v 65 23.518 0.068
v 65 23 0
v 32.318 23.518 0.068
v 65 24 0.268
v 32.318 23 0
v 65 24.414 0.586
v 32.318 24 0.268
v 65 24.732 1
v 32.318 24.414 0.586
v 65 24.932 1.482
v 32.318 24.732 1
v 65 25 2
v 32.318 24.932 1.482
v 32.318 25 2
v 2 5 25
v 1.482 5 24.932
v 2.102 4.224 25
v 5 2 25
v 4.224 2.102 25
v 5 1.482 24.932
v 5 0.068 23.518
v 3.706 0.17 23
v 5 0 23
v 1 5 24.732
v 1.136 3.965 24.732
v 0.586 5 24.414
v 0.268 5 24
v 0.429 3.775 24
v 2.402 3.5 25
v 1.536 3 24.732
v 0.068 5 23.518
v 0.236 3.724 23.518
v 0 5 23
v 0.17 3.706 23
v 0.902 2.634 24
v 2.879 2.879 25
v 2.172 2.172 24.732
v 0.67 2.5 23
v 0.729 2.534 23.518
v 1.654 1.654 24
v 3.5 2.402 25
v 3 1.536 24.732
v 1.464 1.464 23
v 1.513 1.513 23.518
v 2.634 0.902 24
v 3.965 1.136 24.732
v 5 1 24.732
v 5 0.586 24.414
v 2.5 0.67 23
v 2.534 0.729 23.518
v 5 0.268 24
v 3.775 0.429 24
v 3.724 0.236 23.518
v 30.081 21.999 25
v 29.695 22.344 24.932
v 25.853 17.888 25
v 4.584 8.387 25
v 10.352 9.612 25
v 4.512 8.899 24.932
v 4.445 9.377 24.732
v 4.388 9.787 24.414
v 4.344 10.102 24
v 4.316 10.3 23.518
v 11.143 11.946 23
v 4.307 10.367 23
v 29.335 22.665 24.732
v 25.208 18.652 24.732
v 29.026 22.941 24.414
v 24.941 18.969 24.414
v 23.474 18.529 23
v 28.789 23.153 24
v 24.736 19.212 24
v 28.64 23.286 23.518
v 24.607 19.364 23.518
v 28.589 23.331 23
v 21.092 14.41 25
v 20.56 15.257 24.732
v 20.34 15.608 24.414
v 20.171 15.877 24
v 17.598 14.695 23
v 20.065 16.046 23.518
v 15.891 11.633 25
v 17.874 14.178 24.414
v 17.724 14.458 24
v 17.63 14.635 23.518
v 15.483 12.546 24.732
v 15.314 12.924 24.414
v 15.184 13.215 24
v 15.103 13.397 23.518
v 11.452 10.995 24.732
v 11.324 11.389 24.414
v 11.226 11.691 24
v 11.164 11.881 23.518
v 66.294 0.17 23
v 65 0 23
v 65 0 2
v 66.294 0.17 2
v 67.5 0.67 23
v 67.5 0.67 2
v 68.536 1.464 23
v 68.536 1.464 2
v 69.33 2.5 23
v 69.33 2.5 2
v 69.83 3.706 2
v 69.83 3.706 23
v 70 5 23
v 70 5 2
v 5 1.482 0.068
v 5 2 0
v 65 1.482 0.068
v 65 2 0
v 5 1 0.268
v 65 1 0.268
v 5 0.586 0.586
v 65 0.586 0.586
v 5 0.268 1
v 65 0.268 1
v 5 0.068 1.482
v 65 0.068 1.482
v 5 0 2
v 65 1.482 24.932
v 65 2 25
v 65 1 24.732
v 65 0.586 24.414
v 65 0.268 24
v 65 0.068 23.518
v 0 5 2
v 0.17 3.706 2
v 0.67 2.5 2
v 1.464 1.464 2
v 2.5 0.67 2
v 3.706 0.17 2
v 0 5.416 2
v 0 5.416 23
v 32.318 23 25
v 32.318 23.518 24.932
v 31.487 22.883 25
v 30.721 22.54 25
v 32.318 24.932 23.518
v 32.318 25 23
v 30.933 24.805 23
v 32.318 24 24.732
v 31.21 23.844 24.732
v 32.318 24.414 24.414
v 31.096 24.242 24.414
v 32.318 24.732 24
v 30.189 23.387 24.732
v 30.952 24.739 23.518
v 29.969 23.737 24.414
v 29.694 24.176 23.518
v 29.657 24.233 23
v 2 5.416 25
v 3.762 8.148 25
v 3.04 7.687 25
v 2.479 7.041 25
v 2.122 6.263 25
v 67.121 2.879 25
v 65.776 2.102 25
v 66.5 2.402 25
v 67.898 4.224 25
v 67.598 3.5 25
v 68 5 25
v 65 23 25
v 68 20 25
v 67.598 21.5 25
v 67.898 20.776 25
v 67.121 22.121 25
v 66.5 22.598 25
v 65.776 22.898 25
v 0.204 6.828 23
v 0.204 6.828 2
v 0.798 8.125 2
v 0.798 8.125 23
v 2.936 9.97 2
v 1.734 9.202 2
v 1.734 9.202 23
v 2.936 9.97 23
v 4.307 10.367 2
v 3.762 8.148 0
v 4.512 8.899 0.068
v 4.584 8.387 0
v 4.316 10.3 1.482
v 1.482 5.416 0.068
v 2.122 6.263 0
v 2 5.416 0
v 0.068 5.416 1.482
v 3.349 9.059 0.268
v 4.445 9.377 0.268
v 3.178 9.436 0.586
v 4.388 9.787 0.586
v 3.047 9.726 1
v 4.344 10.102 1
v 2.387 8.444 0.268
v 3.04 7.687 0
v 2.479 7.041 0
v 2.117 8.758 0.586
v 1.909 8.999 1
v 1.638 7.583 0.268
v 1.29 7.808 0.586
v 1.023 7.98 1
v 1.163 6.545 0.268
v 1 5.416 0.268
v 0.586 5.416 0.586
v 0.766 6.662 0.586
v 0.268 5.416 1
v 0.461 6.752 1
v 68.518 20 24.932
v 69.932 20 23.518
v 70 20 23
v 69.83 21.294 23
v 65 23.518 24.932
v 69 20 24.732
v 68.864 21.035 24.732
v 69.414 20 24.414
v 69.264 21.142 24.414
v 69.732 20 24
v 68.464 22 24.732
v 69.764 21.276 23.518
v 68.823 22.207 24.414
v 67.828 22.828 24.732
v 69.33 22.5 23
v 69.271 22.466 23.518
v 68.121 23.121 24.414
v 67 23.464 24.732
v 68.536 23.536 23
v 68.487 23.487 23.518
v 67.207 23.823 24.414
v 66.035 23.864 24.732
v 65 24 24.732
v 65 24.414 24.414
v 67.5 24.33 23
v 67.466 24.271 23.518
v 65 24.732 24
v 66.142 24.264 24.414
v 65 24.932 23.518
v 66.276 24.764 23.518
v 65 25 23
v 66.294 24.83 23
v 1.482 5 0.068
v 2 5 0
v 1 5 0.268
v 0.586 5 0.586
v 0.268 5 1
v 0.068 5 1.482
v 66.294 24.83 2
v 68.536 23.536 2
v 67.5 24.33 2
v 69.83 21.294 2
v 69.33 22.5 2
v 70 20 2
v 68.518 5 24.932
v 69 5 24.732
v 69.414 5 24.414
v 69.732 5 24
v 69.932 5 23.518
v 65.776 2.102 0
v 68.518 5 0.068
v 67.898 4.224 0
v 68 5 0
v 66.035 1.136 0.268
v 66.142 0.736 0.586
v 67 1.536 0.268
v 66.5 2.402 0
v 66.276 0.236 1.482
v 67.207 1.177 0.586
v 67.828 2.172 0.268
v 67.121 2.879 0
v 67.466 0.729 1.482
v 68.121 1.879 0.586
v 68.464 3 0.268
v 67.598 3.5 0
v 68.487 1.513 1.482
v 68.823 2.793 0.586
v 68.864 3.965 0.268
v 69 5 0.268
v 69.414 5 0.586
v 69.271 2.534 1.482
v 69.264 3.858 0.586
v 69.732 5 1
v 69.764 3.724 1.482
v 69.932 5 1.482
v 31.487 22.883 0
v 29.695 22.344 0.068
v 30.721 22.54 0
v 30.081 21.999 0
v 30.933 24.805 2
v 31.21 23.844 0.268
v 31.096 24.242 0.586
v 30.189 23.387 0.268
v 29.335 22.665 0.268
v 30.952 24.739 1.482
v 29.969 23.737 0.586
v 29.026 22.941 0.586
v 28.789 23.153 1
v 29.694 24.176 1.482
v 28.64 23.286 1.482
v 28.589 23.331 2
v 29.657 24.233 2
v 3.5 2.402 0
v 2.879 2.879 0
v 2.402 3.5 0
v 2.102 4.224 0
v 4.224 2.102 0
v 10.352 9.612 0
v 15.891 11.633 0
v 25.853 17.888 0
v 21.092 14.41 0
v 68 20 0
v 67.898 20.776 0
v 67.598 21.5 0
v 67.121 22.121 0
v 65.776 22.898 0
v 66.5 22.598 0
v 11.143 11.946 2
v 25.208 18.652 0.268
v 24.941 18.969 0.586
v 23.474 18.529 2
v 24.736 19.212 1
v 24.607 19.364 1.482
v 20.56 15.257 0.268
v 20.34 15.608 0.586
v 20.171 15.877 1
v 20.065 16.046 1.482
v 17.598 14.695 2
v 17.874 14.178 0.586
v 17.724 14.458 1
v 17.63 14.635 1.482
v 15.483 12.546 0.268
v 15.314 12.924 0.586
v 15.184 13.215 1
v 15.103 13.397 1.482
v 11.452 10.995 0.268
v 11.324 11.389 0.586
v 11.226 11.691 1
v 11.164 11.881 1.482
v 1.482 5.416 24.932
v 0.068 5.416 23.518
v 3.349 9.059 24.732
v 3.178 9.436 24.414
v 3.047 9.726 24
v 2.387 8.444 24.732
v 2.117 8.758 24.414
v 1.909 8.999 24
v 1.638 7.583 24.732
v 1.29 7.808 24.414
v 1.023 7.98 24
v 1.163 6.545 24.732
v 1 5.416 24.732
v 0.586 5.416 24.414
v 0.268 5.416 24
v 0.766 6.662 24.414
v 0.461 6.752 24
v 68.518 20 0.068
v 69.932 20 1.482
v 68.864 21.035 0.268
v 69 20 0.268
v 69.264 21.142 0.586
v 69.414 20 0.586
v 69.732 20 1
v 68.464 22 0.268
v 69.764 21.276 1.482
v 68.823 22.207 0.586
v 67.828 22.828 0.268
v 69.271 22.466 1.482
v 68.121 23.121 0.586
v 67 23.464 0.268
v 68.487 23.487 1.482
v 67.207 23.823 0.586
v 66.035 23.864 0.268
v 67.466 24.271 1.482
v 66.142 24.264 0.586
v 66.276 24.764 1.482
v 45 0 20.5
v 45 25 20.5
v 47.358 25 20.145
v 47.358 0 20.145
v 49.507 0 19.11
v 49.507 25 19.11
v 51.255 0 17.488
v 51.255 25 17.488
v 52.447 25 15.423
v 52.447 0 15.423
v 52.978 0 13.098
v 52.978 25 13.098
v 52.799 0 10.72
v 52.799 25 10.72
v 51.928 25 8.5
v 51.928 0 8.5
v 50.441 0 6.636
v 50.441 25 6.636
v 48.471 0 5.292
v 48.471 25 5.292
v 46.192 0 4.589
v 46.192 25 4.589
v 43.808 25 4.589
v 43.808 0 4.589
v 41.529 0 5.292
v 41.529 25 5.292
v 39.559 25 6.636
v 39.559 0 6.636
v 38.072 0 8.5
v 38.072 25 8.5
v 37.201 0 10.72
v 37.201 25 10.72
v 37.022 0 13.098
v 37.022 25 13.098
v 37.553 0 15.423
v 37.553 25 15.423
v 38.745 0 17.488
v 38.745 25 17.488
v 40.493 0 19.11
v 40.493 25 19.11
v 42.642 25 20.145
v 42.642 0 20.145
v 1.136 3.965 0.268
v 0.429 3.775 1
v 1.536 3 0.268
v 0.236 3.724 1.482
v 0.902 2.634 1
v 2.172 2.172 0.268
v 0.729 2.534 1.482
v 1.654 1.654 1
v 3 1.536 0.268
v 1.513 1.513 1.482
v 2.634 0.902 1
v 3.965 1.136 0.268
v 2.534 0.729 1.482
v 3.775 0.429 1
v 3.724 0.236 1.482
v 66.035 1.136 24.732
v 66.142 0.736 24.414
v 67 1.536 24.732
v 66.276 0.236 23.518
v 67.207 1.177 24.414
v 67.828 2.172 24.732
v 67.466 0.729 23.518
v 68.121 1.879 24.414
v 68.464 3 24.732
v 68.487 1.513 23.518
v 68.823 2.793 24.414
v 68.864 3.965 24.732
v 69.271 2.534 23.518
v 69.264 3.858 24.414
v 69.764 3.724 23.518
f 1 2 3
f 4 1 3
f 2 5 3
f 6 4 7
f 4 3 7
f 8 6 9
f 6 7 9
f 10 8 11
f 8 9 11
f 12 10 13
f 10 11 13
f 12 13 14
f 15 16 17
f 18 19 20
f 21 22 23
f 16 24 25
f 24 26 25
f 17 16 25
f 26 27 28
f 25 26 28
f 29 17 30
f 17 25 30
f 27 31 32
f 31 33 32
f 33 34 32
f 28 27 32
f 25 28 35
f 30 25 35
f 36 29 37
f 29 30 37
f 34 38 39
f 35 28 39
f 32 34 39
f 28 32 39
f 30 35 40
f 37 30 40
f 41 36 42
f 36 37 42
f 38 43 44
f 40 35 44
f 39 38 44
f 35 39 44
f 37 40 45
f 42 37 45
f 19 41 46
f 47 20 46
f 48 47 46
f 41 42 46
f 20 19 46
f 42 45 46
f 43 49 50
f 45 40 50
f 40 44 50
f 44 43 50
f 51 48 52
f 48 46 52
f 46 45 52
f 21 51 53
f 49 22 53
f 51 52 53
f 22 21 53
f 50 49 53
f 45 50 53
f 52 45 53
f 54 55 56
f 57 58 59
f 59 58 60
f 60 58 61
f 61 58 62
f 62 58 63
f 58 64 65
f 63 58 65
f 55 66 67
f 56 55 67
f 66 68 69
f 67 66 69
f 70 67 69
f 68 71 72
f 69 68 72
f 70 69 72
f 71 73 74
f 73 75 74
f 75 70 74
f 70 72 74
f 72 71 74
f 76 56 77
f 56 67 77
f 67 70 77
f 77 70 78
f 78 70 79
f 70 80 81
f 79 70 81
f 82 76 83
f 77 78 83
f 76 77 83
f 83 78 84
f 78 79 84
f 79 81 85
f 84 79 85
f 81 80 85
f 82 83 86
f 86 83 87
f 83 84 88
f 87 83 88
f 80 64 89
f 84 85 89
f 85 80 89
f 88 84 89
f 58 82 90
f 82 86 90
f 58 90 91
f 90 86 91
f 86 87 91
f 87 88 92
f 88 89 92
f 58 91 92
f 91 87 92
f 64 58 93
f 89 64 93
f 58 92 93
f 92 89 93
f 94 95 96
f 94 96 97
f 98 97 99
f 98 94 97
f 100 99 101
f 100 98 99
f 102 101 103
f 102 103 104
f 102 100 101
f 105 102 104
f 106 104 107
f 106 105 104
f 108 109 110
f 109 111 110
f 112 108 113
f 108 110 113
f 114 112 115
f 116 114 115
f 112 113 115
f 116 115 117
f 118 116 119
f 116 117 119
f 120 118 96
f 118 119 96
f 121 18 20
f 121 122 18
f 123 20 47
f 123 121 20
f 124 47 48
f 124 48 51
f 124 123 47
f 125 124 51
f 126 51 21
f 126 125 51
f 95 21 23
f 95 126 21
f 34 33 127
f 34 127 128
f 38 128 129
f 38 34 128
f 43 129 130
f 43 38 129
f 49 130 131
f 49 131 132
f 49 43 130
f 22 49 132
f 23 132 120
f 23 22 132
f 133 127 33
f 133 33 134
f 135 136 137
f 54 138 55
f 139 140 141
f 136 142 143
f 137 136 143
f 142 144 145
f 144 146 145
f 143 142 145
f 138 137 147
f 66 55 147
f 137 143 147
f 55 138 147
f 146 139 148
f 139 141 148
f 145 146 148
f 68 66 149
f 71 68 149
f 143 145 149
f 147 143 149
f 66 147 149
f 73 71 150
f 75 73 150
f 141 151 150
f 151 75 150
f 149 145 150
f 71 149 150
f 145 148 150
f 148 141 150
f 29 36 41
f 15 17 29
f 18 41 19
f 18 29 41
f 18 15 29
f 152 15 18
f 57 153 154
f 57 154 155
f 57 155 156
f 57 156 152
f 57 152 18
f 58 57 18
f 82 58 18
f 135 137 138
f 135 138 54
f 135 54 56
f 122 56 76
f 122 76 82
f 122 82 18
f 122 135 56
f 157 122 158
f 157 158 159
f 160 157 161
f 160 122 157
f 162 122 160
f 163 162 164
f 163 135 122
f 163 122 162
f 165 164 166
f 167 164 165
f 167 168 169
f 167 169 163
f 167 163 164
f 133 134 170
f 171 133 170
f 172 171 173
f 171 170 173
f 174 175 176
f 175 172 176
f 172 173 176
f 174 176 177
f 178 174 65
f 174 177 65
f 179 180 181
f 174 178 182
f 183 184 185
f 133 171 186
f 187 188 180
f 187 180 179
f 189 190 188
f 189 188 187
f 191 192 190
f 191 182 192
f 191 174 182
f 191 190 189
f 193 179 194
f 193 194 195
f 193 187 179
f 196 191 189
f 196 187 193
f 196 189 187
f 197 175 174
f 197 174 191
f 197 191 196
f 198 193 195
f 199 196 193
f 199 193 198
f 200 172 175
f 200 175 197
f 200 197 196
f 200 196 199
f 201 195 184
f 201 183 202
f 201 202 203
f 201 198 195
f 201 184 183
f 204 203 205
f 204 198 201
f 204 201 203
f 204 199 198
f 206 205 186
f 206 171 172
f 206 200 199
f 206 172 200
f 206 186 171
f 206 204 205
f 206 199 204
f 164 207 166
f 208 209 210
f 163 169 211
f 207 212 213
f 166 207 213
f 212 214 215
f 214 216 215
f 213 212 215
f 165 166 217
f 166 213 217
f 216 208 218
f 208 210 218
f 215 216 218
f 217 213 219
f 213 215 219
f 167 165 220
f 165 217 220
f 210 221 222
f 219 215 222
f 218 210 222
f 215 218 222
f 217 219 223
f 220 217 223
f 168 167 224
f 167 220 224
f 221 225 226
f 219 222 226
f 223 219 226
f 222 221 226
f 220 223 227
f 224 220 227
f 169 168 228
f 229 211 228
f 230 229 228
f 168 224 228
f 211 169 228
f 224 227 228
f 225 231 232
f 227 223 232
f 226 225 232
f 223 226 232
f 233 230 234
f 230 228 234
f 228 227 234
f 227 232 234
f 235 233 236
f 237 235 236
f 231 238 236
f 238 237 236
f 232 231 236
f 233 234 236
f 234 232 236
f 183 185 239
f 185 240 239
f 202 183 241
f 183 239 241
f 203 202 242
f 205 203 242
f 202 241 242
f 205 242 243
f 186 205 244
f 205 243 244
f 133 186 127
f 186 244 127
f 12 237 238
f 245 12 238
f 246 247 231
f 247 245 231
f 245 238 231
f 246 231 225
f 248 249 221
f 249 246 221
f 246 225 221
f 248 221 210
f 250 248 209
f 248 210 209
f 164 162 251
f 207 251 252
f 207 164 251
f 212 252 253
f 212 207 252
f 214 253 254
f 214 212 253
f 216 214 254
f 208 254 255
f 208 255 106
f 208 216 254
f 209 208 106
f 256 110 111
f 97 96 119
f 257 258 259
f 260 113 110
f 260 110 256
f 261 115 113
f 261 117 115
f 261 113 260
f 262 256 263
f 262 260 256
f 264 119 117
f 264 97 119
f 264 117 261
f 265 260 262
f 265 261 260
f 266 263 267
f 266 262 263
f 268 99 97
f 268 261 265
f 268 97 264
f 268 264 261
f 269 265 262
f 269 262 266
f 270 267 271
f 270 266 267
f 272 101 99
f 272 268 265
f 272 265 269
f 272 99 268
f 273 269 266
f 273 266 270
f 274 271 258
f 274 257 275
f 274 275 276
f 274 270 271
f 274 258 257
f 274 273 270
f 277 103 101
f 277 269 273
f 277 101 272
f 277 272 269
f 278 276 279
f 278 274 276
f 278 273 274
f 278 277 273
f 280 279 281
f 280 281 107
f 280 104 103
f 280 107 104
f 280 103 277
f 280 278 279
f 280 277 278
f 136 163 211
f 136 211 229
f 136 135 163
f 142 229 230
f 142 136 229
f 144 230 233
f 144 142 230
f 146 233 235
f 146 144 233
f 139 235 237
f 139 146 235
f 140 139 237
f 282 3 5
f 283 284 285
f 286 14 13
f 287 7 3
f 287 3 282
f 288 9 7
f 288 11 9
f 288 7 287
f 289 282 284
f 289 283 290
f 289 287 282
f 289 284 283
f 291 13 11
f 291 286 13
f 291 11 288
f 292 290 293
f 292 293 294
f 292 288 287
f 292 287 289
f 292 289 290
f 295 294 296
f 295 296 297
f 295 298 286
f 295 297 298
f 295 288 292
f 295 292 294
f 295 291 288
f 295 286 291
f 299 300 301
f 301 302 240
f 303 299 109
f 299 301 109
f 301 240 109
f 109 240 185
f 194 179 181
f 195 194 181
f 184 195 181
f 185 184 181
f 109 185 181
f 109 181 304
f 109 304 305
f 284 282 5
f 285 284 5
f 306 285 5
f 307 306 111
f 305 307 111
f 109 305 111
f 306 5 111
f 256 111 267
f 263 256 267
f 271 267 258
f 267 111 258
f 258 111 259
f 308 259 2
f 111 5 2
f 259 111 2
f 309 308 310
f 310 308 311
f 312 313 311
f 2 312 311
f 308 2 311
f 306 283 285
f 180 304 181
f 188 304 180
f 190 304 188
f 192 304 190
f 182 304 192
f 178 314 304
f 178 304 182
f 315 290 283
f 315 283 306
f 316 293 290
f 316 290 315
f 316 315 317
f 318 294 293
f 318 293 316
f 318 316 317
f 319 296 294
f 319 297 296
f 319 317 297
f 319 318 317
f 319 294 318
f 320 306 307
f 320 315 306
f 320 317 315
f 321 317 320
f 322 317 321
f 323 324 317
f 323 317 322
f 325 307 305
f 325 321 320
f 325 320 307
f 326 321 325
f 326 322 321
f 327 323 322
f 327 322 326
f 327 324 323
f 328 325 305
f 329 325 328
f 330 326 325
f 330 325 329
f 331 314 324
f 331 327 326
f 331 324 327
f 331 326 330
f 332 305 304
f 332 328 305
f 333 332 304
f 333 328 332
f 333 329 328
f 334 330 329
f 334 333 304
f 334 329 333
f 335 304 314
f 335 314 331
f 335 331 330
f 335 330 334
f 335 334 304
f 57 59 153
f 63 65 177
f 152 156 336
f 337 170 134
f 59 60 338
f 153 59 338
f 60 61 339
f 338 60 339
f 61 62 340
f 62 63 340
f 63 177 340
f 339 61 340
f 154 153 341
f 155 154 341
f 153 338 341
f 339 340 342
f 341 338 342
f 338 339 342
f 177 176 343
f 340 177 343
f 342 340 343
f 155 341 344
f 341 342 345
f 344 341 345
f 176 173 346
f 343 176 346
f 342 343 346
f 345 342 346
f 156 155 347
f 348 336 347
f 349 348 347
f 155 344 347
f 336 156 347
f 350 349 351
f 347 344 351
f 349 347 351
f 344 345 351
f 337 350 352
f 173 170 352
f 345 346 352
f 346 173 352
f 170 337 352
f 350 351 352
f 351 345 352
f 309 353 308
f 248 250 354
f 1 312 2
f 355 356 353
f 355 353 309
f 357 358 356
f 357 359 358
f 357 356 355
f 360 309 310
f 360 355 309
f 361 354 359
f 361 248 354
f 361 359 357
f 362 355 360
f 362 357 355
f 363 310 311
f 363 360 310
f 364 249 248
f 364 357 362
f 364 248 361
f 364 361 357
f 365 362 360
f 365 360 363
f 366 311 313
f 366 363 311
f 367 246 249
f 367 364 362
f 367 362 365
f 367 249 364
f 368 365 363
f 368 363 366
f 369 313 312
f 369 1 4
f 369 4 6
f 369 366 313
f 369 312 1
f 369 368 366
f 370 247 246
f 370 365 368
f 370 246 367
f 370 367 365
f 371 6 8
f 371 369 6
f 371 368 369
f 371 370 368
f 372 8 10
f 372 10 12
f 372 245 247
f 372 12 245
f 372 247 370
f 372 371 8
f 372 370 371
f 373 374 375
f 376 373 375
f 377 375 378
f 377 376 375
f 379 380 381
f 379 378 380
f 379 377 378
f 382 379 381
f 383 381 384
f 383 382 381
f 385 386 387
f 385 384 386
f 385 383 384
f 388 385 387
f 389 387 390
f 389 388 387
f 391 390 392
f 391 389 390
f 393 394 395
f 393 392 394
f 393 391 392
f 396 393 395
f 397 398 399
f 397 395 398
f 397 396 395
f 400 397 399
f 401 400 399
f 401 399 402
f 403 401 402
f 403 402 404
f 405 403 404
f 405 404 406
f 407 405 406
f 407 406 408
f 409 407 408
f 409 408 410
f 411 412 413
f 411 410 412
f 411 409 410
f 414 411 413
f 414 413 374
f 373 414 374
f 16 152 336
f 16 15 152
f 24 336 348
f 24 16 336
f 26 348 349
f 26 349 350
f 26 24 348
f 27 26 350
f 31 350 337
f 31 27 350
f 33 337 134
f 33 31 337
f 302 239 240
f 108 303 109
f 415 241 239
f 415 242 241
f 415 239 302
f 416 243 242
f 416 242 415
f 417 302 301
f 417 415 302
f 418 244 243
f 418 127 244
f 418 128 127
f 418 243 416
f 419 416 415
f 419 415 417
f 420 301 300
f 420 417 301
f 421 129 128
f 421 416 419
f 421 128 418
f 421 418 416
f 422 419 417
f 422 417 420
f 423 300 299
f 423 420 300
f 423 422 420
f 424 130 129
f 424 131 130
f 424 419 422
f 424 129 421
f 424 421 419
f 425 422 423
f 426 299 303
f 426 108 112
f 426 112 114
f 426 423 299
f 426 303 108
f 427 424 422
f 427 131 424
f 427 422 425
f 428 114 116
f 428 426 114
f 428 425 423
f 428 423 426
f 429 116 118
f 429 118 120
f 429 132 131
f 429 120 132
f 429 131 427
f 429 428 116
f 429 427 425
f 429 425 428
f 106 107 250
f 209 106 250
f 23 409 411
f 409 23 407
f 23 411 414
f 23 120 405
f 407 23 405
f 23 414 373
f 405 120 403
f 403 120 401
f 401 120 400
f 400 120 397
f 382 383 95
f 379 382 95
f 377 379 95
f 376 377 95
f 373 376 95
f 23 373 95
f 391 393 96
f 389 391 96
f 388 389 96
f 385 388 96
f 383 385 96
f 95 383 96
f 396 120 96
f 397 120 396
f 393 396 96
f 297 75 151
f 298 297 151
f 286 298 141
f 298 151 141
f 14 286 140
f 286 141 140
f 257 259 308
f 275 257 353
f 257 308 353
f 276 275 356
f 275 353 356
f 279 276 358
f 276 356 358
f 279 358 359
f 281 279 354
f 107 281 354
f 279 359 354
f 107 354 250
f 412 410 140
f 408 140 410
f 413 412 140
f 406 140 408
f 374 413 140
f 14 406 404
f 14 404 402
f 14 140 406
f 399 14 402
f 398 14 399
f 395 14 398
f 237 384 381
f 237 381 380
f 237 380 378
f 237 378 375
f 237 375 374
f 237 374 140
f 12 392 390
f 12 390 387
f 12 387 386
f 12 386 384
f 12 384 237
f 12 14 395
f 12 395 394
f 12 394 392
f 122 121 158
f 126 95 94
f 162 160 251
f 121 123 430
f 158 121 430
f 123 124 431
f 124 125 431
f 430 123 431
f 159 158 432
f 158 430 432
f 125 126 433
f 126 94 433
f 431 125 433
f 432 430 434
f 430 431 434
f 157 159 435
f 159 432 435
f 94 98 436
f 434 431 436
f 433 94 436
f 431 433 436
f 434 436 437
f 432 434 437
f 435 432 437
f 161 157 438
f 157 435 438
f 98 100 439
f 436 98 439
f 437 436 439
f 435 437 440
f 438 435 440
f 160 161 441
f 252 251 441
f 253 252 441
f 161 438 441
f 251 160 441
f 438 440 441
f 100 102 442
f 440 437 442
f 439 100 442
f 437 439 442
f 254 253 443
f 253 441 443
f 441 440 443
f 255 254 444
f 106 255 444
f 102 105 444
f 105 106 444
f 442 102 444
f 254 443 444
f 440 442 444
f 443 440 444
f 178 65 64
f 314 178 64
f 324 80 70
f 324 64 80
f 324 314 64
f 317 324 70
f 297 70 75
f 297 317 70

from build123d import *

# Parameters (mm, degrees)
ESQUISSE1_W                  = 70
ESQUISSE1_H                  = 25
BOSS_EXTRU_1_DEPTH           = 25
ENL_V_MAT_EXTRU_1_DEPTH      = 79.421935707
ENL_V_MAT_EXTRU_1_DEPTH_BACK = 79.421935707
CONG_1_R                     = 5
CONG_2_R                     = 2
ENL_V_MAT_EXTRU_2_DEPTH      = 79.421935739
ENL_V_MAT_EXTRU_2_DEPTH_BACK = 79.421935739
ESQUISSE3_R                  = 8


with BuildPart() as part:
    # Esquisse1 → Boss.-Extru.1 (new body)
    with BuildSketch(Plane.XY):
        with Locations((35, 12.5)):
            Rectangle(ESQUISSE1_W, ESQUISSE1_H)
    extrude(amount=BOSS_EXTRU_1_DEPTH)

    # Esquisse2 → Enlèv. mat.-Extru.1 (cut, two sides: drawn at the far end of the back side and taken through both)
    with BuildSketch(Plane.XY.offset(25).offset(-ENL_V_MAT_EXTRU_1_DEPTH_BACK)):
        with BuildLine():
            Line((30, 25), (0, 25))
            Line((0, 25), (0, 10))
            ThreePointArc((0, 10), (16.648162051, 14.203675898), (30, 25))
        make_face()
    extrude(amount=ENL_V_MAT_EXTRU_1_DEPTH + ENL_V_MAT_EXTRU_1_DEPTH_BACK, mode=Mode.SUBTRACT)

    # Congé1
    cong_1_edges = [part.edges().sort_by_distance(p)[0] for p in [
        (30, 25, 12.5),
        (0, 10, 12.5),
        (70, 25, 12.5),
        (70, 0, 12.5),
        (0, 0, 12.5),
    ]]
    fillet(cong_1_edges, radius=CONG_1_R)

    # Congé2
    cong_2_edges = [part.edges().sort_by_distance(p)[0] for p in [
        (35, 0, 0),
        (35, 0, 25),
        (17.598161914, 14.694657605, 0),
        (48.658916792, 25, 0),
        (70, 12.5, 0),
        (0, 5.207778491, 0),
        (68.535533906, 23.535533906, 0),
        (68.535533906, 1.464466094, 0),
        (1.227276928, 8.696800743, 0),
        (30.275283676, 24.563769261, 0),
        (1.464466094, 1.464466094, 0),
        (0, 5.207778491, 25),
        (48.658916792, 25, 25),
        (17.598161914, 14.694657605, 25),
        (70, 12.5, 25),
        (68.535533906, 23.535533906, 25),
        (68.535533906, 1.464466094, 25),
        (1.227276928, 8.696800743, 25),
        (30.275283676, 24.563769261, 25),
        (1.464466094, 1.464466094, 25),
    ]]
    fillet(cong_2_edges, radius=CONG_2_R)

    # Esquisse3 → Enlèv. mat.-Extru.2 (cut, two sides: drawn at the far end of the back side and taken through both)
    with BuildSketch(Plane(origin=(0, 25, 0), x_dir=(1, 0, 0), z_dir=(0, 1, 0)).offset(-ENL_V_MAT_EXTRU_2_DEPTH_BACK)):
        with Locations(Location((45, -12.5, 0), (0, 0, 270))):
            Circle(ESQUISSE3_R)
    extrude(amount=ENL_V_MAT_EXTRU_2_DEPTH + ENL_V_MAT_EXTRU_2_DEPTH_BACK, mode=Mode.SUBTRACT)


solid = part.part
